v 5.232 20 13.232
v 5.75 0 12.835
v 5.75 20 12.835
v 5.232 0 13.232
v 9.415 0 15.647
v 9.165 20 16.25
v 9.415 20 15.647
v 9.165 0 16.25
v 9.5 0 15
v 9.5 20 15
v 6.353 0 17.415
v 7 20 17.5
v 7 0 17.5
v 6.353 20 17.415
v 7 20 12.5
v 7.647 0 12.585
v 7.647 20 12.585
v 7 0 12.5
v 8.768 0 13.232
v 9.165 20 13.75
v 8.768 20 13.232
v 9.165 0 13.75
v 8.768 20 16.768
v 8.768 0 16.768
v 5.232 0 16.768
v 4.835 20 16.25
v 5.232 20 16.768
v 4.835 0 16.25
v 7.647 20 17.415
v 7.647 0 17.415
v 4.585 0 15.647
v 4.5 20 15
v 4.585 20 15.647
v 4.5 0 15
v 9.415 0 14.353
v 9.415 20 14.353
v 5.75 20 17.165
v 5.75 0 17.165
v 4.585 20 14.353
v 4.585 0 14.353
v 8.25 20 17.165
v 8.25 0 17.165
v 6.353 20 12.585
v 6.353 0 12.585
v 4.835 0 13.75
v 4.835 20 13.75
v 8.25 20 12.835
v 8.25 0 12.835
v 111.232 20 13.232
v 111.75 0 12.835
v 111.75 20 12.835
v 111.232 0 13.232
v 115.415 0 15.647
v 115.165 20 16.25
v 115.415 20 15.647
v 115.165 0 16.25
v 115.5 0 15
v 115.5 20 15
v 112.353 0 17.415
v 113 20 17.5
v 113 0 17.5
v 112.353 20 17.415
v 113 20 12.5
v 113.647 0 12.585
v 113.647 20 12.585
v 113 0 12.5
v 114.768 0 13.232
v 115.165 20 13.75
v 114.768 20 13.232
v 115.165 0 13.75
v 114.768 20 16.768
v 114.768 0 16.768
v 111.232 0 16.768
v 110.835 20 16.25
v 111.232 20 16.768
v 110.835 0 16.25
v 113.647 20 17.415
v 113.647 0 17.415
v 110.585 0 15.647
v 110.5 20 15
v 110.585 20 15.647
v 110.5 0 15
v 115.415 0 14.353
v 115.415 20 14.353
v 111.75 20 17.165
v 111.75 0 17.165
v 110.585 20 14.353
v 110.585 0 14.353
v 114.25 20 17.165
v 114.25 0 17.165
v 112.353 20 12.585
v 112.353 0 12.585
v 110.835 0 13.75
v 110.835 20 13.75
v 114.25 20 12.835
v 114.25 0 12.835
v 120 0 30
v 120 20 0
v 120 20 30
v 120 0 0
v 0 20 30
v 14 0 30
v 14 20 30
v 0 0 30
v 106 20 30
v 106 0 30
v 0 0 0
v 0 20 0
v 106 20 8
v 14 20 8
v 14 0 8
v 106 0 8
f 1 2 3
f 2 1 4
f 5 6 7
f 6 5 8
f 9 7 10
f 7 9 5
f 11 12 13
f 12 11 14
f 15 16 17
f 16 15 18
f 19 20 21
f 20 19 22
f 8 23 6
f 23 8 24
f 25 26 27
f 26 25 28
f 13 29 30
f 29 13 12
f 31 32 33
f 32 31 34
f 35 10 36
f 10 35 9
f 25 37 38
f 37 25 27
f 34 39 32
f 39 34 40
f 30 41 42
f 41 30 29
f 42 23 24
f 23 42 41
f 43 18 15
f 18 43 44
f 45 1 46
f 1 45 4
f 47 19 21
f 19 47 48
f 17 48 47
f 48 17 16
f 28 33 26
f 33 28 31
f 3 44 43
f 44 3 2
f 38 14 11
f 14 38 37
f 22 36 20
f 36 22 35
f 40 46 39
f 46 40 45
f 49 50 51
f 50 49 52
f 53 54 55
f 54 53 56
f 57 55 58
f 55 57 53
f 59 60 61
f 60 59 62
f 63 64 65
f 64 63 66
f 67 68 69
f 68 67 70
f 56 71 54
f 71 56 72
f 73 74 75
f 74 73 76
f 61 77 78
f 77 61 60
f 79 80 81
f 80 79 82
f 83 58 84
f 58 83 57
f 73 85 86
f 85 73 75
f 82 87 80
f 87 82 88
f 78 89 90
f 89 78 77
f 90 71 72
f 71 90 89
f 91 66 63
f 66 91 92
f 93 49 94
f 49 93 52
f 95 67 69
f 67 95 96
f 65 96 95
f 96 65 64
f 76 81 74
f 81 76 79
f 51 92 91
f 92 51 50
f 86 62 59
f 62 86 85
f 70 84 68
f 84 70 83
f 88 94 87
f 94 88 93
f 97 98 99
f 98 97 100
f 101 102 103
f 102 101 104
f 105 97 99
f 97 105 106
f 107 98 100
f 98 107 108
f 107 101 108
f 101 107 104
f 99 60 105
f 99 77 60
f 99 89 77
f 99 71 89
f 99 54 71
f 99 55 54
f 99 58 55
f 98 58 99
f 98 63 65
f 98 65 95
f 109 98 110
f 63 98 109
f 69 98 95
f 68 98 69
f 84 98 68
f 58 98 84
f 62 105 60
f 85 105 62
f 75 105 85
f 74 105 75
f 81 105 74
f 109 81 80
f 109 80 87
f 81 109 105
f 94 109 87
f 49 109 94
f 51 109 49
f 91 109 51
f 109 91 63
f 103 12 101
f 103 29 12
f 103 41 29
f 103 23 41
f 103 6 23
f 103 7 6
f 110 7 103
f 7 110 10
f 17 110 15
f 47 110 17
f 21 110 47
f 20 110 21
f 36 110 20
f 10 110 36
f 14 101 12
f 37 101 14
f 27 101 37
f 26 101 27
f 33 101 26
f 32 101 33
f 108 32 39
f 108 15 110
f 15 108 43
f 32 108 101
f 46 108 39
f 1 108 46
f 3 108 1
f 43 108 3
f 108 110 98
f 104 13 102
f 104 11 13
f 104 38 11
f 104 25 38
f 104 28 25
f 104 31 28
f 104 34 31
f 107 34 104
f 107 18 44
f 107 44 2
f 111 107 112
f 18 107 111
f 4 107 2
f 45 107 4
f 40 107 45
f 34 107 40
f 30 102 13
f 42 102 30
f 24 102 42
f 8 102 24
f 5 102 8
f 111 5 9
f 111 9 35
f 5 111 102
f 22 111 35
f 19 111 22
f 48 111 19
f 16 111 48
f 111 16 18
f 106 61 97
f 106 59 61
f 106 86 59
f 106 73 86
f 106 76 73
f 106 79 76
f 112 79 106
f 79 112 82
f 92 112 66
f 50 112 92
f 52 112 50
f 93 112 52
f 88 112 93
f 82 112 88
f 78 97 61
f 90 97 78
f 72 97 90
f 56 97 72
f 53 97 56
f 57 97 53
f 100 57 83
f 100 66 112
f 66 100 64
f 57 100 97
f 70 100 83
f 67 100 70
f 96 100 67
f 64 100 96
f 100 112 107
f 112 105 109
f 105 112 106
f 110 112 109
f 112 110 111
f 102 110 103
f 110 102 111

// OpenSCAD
$fn=24;
difference(){cube([120,20,30]);translate([14,-1,8])cube([92,22,23]);for(x=[7,113])translate([x,21,15])rotate([90,0,0])cylinder(h=22,r=2.5);}
